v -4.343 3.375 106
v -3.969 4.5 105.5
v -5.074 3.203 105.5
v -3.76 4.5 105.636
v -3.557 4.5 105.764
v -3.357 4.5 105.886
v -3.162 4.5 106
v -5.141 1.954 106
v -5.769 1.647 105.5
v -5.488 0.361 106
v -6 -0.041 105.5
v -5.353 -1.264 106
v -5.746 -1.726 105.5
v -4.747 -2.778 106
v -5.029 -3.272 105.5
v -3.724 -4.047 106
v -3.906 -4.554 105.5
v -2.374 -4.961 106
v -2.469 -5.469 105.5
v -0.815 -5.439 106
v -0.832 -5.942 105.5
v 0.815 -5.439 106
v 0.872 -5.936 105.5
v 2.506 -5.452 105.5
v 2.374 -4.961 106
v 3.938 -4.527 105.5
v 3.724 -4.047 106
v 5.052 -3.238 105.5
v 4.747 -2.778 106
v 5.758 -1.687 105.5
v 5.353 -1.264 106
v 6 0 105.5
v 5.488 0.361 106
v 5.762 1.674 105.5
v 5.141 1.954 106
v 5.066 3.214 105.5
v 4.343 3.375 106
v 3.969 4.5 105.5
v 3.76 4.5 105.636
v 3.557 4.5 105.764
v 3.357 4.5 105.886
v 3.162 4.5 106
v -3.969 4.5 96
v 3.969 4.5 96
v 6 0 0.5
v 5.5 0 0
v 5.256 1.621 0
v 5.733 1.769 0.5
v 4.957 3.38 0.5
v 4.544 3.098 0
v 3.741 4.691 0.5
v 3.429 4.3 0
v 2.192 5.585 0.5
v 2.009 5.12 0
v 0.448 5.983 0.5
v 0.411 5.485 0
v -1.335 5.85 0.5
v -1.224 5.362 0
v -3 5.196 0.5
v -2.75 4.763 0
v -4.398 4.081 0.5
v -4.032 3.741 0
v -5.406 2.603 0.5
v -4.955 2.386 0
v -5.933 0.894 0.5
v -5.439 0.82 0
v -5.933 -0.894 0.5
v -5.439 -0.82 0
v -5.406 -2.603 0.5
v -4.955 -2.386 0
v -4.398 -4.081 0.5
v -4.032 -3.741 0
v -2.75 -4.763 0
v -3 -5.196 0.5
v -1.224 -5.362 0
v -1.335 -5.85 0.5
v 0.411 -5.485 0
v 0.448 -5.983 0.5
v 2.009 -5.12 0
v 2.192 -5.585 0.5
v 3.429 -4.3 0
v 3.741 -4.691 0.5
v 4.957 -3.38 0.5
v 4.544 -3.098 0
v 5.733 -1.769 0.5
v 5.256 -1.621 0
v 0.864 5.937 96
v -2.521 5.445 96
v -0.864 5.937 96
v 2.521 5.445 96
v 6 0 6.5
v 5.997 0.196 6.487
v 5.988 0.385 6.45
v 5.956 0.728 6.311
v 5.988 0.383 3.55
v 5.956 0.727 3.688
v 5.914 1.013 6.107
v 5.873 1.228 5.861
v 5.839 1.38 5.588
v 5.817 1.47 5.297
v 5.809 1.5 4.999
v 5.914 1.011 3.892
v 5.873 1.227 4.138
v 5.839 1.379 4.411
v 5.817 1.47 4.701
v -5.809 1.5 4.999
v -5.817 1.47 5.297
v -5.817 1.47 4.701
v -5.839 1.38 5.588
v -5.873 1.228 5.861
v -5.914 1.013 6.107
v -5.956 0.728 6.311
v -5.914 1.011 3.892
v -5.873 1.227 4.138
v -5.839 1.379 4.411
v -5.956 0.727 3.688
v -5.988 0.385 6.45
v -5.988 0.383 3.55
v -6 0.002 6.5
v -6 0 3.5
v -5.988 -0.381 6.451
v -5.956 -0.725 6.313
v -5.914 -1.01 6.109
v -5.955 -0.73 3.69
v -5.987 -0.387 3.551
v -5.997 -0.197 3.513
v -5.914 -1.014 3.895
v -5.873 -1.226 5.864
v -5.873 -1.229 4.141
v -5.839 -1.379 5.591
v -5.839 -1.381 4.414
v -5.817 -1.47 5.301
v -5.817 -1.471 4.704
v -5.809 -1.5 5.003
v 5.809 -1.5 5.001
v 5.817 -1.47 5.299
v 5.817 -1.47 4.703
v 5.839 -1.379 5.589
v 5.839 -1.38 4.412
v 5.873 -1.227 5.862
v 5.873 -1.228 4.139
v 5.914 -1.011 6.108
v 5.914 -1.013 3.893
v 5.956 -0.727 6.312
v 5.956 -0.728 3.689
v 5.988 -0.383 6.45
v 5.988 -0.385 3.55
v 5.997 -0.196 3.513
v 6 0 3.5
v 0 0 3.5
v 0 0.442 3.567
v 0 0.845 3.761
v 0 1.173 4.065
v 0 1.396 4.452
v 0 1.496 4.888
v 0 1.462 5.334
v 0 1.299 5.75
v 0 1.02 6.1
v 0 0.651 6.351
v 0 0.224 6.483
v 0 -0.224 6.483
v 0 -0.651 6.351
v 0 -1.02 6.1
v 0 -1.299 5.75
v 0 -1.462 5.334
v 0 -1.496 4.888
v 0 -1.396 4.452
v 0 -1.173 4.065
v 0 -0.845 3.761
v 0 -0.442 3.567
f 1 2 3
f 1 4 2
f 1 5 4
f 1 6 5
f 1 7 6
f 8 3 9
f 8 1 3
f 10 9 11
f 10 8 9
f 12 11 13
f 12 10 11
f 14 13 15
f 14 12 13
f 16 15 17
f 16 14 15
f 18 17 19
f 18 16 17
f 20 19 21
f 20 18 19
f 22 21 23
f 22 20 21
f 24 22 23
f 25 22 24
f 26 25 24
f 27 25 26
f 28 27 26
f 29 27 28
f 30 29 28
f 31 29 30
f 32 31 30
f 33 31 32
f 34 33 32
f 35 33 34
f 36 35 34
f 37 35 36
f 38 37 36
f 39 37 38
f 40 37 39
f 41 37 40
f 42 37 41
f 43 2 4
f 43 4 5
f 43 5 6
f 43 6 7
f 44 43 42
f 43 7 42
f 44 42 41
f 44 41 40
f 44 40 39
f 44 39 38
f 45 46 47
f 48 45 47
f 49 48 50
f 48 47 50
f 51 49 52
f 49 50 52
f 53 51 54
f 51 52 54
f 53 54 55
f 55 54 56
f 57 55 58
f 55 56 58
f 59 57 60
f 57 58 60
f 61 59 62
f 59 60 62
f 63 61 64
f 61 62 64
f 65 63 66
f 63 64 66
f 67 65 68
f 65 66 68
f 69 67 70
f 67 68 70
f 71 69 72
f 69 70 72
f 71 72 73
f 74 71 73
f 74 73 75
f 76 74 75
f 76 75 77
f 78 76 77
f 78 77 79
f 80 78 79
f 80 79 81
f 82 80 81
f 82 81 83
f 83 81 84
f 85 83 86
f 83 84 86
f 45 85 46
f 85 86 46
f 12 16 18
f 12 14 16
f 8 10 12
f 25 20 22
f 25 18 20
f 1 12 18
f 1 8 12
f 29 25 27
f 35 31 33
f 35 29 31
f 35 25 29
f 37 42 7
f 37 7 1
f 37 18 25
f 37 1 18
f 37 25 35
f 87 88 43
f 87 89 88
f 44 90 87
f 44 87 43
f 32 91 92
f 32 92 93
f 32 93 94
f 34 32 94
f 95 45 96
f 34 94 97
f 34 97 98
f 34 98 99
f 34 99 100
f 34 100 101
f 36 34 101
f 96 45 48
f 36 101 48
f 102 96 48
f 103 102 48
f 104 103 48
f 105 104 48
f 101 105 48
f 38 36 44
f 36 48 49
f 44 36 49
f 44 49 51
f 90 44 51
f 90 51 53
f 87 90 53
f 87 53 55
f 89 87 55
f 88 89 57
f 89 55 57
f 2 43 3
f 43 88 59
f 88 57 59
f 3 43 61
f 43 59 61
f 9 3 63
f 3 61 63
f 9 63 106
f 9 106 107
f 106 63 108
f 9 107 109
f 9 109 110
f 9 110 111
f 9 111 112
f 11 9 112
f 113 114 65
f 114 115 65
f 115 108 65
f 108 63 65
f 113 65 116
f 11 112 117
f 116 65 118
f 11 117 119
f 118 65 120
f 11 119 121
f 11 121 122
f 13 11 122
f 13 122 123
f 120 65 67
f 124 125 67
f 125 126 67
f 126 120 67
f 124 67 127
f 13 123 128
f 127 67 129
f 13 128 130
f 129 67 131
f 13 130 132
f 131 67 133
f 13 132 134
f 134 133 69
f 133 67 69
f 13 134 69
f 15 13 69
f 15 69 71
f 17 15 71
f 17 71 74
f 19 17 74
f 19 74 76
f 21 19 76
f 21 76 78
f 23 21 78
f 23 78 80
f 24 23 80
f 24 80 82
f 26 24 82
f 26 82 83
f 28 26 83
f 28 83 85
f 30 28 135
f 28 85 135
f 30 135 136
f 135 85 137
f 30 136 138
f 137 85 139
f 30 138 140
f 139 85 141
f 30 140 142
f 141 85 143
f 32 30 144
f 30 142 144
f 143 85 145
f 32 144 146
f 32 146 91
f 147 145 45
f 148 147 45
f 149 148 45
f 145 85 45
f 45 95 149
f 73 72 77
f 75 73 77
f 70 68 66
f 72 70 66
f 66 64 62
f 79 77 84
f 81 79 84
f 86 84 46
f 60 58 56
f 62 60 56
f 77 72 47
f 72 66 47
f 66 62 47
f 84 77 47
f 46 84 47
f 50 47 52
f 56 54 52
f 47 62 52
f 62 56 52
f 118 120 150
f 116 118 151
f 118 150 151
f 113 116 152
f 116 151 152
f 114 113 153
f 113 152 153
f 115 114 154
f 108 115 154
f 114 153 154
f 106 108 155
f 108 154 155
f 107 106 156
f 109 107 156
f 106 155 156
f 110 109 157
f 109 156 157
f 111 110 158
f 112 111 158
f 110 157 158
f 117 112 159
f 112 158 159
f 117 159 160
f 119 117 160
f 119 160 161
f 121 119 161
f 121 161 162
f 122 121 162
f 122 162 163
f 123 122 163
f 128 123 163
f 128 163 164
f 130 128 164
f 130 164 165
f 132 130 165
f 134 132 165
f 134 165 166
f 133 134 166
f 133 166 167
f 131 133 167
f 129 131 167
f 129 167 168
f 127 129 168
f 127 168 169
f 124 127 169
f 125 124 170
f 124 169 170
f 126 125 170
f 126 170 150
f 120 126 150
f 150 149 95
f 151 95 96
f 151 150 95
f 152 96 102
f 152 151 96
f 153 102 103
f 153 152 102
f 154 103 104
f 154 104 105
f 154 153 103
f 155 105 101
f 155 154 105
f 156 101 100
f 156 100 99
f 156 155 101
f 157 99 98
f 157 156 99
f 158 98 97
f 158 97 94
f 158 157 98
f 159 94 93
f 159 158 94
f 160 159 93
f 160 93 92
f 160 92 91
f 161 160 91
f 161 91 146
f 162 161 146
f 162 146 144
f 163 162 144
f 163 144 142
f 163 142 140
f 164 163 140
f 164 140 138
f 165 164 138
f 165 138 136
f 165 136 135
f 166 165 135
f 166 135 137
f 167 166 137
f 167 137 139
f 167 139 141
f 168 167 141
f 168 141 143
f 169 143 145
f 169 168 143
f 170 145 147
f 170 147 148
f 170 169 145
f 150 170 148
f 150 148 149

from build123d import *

# Parameters (mm, degrees)
SKETCH1_R               = 6
BOSS_EXTRUDE1_DEPTH     = 106
CHAMFER1_SIZE           = 0.5
SKETCH2_W               = 20
SKETCH2_H               = 5
CUT_EXTRUDE1_DEPTH      = 10
SKETCH3_R               = 1.5
CUT_EXTRUDE2_DEPTH      = 7
CUT_EXTRUDE2_DEPTH_BACK = 7


with BuildPart() as part:
    # Sketch1 → Boss-Extrude1 (new body)
    with BuildSketch(Plane.XY):
        Circle(SKETCH1_R)
    extrude(amount=BOSS_EXTRUDE1_DEPTH)

    # Chamfer1
    chamfer1_edges = [part.edges().sort_by_distance(p)[0] for p in [
        (-6, 0, 0),
        (-6, 0, 106),
    ]]
    chamfer(chamfer1_edges, length=CHAMFER1_SIZE)

    # Sketch2 → Cut-Extrude1 (cut)
    with BuildSketch(Plane.XY.offset(106)):
        with Locations((0, 7)):
            Rectangle(SKETCH2_W, SKETCH2_H)
    extrude(amount=-CUT_EXTRUDE1_DEPTH, mode=Mode.SUBTRACT)

    # Sketch3 → Cut-Extrude2 (cut, two sides)
    with BuildSketch(Plane(origin=(0, 0, 0), x_dir=(0, 0, -1), z_dir=(1, 0, 0))) as cut_extrude2_sk:
        with Locations((-5, 0)):
            Circle(SKETCH3_R)
    extrude(amount=CUT_EXTRUDE2_DEPTH, mode=Mode.SUBTRACT)
    extrude(cut_extrude2_sk.sketch, amount=-CUT_EXTRUDE2_DEPTH_BACK, mode=Mode.SUBTRACT)


solid = part.part
